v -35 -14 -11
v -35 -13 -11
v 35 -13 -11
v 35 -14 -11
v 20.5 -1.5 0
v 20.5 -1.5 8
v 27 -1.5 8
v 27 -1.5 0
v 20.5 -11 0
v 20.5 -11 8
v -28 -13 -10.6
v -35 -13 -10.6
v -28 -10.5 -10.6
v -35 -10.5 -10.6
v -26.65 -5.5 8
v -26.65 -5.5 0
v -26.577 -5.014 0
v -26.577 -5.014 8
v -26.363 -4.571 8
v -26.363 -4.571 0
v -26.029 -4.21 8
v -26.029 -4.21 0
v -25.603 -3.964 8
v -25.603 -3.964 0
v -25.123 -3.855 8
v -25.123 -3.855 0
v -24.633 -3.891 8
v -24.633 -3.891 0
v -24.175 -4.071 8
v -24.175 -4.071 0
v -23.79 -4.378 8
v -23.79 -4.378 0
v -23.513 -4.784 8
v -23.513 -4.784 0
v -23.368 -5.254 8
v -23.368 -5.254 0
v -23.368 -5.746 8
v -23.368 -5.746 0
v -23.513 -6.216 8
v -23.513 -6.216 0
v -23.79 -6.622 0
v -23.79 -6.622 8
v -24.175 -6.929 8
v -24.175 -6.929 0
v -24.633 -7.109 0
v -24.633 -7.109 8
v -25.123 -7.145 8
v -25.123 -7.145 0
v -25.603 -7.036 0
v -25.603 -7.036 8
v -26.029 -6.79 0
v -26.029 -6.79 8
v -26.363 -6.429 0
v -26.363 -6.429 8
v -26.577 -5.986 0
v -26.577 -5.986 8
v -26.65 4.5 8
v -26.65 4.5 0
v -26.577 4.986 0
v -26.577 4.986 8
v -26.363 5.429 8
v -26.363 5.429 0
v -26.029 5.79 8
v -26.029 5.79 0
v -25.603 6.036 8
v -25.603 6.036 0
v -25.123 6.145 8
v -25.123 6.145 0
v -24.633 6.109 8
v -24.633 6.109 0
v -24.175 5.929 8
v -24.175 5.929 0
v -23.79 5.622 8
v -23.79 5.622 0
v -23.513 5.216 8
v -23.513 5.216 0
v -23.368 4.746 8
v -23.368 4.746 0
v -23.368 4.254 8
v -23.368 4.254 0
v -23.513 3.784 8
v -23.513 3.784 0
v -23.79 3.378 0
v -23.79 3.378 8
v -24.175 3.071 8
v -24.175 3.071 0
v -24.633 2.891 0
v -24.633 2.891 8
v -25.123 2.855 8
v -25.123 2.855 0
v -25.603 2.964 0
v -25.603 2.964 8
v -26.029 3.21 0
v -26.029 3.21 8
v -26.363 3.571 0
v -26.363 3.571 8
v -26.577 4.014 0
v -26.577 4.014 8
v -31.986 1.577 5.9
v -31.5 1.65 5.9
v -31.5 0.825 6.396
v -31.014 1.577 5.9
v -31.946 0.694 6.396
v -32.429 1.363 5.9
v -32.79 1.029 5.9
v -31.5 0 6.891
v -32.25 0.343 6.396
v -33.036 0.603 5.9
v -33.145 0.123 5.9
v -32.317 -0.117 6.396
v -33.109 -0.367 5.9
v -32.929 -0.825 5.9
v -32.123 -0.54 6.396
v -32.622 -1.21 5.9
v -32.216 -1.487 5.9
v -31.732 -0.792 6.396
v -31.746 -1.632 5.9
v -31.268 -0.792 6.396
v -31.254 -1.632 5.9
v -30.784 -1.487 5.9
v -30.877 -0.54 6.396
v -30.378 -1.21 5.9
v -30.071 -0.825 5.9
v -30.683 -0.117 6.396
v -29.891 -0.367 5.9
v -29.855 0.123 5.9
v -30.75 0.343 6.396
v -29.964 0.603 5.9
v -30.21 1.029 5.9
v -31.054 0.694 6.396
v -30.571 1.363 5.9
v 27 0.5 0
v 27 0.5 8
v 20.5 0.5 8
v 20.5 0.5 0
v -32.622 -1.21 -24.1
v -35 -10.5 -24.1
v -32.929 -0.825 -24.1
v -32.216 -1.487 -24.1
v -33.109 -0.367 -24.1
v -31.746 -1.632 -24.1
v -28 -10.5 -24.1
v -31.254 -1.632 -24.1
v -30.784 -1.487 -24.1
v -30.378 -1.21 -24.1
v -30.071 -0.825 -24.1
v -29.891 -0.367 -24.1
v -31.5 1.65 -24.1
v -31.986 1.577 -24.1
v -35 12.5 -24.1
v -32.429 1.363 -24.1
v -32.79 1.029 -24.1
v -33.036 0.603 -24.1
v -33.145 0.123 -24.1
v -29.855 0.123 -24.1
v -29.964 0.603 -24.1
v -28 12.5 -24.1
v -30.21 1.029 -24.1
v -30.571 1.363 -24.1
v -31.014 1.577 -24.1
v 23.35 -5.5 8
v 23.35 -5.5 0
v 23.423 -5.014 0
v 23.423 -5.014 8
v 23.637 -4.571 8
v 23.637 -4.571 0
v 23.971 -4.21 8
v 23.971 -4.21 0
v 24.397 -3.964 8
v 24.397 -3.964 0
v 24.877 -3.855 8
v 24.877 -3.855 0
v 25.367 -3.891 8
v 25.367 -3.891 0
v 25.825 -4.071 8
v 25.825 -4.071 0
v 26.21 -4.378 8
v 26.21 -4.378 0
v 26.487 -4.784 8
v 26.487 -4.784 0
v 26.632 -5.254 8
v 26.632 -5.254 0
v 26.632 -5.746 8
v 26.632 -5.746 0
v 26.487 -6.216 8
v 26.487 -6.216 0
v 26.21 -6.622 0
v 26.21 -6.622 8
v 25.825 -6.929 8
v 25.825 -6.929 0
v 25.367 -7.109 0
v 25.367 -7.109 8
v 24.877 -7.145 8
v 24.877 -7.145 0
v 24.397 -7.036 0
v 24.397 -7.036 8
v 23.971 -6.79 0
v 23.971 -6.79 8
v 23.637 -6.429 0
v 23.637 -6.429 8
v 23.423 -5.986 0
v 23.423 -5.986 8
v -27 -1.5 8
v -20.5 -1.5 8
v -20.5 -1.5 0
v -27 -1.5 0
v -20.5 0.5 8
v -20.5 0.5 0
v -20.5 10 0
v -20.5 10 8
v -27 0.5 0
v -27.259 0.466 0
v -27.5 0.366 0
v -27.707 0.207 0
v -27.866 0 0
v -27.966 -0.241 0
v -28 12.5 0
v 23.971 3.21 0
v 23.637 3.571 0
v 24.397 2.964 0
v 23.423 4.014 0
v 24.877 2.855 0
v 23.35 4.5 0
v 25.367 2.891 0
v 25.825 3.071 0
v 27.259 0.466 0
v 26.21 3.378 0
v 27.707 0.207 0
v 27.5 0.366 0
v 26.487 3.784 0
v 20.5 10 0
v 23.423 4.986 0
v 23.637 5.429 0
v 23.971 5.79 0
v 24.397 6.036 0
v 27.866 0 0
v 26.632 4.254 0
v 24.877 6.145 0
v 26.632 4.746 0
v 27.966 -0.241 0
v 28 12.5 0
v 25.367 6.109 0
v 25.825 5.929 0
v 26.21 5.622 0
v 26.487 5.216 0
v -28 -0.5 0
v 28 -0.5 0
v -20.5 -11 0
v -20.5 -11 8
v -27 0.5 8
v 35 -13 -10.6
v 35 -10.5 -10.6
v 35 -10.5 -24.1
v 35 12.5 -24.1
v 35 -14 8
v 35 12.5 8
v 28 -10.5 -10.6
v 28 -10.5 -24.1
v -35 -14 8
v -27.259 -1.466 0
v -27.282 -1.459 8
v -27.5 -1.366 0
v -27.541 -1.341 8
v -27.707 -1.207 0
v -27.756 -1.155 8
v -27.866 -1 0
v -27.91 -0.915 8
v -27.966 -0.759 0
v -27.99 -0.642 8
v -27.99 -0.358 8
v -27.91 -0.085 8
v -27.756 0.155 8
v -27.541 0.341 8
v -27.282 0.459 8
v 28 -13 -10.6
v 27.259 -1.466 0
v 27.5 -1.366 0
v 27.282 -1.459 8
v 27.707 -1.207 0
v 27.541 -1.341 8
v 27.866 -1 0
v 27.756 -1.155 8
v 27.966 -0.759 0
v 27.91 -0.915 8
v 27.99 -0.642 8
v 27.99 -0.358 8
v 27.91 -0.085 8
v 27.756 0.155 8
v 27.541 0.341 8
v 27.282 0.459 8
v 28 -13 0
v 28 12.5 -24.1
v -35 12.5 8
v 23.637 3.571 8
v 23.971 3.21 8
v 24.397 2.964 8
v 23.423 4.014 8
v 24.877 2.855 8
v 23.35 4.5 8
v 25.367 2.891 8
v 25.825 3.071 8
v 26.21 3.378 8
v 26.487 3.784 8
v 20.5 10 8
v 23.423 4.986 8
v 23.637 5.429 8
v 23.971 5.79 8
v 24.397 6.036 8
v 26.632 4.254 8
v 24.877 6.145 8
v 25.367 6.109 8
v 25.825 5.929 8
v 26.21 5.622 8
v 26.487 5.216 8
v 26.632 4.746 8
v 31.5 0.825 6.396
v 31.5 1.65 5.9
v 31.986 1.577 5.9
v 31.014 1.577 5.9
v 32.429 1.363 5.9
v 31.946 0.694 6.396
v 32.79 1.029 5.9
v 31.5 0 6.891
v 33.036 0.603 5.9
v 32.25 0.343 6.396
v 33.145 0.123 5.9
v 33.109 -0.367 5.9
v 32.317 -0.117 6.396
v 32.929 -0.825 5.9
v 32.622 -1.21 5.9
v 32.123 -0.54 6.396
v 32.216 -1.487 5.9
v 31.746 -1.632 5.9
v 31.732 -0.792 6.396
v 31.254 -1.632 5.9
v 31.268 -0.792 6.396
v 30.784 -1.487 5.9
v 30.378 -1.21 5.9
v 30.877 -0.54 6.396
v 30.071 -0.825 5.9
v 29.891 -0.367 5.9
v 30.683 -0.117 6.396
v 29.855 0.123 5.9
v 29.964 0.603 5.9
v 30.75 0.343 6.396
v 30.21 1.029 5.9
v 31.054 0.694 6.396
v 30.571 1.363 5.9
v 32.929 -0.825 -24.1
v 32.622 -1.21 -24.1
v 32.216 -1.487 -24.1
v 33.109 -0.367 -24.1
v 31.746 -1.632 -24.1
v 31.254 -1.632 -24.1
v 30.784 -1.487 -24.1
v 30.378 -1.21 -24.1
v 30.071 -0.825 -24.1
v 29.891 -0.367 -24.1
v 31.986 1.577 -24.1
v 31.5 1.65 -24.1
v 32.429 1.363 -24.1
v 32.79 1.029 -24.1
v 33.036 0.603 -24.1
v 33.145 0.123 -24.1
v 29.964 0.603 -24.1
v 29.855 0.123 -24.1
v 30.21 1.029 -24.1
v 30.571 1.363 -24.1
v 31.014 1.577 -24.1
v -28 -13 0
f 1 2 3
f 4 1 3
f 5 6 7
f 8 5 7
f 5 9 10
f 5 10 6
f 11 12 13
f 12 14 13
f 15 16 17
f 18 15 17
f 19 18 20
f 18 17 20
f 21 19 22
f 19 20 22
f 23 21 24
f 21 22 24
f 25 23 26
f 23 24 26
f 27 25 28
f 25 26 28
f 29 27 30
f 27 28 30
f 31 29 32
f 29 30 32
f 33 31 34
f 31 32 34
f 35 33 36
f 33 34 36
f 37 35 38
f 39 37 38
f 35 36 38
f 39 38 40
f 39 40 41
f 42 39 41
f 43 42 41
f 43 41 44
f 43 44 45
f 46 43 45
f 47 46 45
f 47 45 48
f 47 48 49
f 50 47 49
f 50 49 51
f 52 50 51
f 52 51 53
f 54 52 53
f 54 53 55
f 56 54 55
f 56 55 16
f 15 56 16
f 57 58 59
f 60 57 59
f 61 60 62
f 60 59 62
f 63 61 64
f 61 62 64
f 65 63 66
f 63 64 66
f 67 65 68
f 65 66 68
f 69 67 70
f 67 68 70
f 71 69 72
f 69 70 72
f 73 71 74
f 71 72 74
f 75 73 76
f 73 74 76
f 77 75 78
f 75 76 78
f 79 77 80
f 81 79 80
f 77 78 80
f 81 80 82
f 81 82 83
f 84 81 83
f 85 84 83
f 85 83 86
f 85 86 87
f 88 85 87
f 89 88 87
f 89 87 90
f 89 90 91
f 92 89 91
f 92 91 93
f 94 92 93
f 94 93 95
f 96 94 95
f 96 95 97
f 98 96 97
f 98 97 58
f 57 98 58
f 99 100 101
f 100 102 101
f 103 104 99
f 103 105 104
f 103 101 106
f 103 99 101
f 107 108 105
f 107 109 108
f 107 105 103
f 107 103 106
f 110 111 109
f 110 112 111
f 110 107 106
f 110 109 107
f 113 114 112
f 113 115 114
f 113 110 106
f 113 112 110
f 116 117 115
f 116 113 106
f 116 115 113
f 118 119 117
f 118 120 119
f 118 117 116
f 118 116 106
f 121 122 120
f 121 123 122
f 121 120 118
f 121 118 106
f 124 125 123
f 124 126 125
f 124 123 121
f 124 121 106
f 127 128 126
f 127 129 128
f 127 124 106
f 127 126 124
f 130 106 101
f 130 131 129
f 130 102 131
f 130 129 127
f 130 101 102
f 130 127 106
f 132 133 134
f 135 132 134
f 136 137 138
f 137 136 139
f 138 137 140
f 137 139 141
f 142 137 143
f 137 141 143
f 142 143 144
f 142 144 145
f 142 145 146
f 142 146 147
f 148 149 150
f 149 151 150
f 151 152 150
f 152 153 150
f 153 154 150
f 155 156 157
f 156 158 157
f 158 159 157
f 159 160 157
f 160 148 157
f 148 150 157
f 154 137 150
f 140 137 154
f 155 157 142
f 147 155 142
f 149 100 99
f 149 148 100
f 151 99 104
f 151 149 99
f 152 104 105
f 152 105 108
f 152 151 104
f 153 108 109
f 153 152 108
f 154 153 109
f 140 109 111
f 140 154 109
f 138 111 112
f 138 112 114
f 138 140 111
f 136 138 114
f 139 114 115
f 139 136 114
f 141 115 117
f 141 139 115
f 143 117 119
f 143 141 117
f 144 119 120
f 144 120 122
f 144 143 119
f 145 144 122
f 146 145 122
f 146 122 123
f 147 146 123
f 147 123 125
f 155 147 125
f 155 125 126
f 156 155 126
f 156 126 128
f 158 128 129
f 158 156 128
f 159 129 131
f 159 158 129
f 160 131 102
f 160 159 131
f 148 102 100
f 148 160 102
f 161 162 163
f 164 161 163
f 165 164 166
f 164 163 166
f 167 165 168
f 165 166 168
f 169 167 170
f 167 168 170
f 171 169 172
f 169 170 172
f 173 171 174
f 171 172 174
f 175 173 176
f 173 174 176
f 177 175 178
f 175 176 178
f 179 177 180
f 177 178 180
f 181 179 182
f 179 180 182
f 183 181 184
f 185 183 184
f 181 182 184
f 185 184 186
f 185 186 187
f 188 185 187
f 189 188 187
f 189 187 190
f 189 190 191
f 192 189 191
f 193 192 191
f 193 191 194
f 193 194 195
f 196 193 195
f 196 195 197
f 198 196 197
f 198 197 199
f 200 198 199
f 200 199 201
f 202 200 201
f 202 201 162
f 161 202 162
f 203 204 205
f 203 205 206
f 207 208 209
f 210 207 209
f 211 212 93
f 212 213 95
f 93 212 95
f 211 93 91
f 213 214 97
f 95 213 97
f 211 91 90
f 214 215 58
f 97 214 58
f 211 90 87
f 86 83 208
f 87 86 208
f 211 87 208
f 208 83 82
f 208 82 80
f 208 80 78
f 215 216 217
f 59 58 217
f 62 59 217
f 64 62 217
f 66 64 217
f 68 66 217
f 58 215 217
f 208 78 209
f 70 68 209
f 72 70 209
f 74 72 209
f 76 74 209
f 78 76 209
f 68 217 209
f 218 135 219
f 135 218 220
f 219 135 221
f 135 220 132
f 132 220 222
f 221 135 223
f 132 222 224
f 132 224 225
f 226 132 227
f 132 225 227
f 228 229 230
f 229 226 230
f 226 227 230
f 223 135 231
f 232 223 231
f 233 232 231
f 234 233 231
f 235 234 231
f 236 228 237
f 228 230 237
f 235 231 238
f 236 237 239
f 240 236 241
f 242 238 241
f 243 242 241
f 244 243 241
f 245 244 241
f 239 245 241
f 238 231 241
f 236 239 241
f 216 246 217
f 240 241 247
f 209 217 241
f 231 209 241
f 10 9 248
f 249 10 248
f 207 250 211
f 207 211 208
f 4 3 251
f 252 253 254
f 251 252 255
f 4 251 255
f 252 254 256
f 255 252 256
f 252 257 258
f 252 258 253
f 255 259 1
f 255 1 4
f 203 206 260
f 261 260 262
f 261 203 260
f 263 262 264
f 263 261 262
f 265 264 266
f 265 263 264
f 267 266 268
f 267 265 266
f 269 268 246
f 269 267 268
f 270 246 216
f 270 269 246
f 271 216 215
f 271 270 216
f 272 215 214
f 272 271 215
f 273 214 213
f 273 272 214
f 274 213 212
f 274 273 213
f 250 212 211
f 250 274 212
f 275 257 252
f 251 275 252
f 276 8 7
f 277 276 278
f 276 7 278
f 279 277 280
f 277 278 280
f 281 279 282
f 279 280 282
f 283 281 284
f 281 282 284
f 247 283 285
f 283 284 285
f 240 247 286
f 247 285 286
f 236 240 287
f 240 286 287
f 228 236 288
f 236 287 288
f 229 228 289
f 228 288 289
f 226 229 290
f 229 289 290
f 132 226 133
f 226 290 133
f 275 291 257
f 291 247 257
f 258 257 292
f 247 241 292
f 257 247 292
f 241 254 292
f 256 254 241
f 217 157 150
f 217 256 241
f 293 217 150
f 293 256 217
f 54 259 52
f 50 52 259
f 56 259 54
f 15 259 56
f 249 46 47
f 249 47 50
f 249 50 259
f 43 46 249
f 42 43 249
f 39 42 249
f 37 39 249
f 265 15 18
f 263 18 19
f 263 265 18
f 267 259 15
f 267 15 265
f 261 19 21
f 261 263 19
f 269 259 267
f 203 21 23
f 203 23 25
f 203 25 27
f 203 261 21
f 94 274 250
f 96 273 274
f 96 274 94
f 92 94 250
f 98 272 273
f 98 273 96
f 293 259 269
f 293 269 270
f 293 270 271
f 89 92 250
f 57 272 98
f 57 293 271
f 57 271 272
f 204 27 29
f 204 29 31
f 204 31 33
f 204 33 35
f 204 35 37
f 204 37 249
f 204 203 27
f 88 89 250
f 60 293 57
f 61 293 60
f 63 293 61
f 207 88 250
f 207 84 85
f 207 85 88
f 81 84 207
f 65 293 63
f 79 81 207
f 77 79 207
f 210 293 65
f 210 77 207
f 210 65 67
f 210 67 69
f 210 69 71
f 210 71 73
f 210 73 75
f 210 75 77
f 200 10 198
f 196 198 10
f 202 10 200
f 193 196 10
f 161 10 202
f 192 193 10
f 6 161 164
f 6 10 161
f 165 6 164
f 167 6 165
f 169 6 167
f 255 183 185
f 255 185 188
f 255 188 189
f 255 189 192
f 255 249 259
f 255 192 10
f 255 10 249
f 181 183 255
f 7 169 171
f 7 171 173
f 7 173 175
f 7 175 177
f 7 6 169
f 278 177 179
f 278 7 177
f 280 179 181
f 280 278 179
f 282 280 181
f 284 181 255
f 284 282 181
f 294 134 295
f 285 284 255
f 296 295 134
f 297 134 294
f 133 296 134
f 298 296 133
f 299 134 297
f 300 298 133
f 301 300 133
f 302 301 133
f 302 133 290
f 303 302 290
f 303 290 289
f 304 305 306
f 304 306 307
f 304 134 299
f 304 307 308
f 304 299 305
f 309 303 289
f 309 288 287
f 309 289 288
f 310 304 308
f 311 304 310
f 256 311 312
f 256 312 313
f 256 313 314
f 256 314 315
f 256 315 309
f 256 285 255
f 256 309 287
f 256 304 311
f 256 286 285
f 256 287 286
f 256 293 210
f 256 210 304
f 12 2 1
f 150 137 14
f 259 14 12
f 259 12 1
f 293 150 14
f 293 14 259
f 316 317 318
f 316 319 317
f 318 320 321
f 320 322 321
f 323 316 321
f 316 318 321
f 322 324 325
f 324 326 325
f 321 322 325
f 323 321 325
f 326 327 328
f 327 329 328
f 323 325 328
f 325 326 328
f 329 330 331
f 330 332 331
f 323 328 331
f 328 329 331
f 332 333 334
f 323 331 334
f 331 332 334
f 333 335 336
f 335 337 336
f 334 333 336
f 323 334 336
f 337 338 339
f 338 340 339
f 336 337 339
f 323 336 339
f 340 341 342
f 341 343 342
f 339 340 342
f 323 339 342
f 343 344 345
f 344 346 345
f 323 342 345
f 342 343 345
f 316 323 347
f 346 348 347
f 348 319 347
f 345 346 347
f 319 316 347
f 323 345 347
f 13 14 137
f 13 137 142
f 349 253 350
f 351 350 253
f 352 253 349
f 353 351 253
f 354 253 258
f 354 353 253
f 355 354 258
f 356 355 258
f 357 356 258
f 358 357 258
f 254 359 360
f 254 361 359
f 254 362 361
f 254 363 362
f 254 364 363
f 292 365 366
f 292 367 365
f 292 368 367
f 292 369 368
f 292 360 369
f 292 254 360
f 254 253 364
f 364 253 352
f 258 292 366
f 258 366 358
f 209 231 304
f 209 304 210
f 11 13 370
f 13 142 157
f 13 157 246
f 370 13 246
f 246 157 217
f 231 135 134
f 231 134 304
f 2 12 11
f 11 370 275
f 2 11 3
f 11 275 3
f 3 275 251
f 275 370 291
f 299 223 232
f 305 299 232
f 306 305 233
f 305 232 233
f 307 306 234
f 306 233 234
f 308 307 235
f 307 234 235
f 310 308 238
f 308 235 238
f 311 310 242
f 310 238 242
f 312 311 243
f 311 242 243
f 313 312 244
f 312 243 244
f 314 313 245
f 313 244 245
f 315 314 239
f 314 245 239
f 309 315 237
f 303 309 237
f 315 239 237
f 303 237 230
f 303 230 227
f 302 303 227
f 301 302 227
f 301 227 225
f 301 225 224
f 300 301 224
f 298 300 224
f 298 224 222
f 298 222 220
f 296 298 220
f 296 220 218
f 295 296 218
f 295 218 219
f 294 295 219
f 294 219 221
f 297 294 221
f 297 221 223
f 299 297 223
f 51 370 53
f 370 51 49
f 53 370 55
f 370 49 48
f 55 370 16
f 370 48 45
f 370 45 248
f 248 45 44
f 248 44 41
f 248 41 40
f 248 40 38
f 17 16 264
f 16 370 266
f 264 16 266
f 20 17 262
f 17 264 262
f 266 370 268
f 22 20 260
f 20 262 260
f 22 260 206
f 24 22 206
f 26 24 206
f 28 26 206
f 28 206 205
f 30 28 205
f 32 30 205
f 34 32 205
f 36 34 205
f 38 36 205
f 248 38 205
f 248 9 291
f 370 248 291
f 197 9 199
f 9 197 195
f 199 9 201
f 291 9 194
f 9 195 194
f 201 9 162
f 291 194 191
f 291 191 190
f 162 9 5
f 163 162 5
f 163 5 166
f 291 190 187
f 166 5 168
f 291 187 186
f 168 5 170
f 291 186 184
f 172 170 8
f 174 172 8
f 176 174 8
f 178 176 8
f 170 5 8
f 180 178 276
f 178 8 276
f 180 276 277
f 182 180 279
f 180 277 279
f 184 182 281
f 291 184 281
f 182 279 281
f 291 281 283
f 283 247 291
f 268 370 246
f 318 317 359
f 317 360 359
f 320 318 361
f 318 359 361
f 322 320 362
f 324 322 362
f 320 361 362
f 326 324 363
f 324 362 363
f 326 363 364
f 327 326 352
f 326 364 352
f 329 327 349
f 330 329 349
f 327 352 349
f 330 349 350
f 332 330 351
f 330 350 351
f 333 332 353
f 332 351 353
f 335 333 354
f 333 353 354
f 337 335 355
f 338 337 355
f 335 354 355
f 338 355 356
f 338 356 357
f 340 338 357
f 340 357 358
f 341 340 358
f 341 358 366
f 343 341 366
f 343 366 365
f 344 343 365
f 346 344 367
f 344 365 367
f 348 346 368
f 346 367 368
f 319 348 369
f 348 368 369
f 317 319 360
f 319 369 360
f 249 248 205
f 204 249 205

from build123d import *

# Parameters (mm, degrees)
SKETCH_1_W          = 70
SKETCH_1_H          = 25
EXTRUDE_1_DEPTH     = 8
SKETCH_2_W          = 41
SKETCH_2_H          = 21
CUT_EXTRUDE_1_DEPTH = 24
CUT_EXTRUDE_4_DEPTH = 39.016443811
EXTRUDE_START       = -8
SKETCH_5_W          = 7
SKETCH_5_H          = 25
EXTRUDE_2_DEPTH     = 24.1
SKETCH_9_W          = 7
SKETCH_9_H          = 13.5
CUT_EXTRUDE_3_DEPTH = 2
EXTRUDE_11_DEPTH    = 0.5
SKETCH_20_W         = 70
SKETCH_20_H         = 19
EXTRUDE_12_DEPTH    = 1
M4X0_7_3_D          = 3.3


with BuildPart() as part:
    # 草圖1 → 填料-伸長1 (new body)
    with BuildSketch(Plane.XY):
        Rectangle(SKETCH_1_W, SKETCH_1_H)
    extrude(amount=EXTRUDE_1_DEPTH)

    # 草圖2 → 除料-伸長1 (cut)
    with BuildSketch(Plane(origin=(0, 0, 0), x_dir=(-1, 0, 0), z_dir=(0, 0, -1))):
        with Locations((0, -0.5)):
            Rectangle(SKETCH_2_W, SKETCH_2_H)
    extrude(amount=-CUT_EXTRUDE_1_DEPTH, mode=Mode.SUBTRACT)

    # 草圖10 → 除料-伸長4 (cut, through all)
    with BuildSketch(Plane.XY.offset(8)):
        with BuildLine():
            Line((-27, 0.5), (-14, 0.5))
            ThreePointArc((-14, 0.5), (-13, -0.5), (-14, -1.5))
            Line((-14, -1.5), (-27, -1.5))
            ThreePointArc((-27, -1.5), (-28, -0.5), (-27, 0.5))
        make_face()
    cut_extrude_4 = extrude(amount=-CUT_EXTRUDE_4_DEPTH, mode=Mode.SUBTRACT)

    # 草圖5 → 填料-伸長2 (add)
    with BuildSketch(Plane.XY.offset(8).offset(EXTRUDE_START)):
        with Locations((-31.5, 0)):
            Rectangle(SKETCH_5_W, SKETCH_5_H)
    extrude_2 = extrude(amount=-EXTRUDE_2_DEPTH)

    # 草圖8 → M4x0.7 螺紋孔1 (revolve, cut)
    with BuildSketch(Plane(origin=(-31.5, 0, -24.1), x_dir=(0, 1, 0), z_dir=(1, 0, 0))):
        Polygon((0, 0), (0, 30.991420021), (1.65, 30), (1.65, 0), align=None)
    m4x0_7_1 = revolve(axis=Axis((-31.5, 0, -30.45), (0, 0, 1)), mode=Mode.SUBTRACT)

    # 鏡射1: 除料-伸長4, 填料-伸長2, M4x0.7 螺紋孔1 across plane
    add(cut_extrude_4.mirror(Plane(origin=(0, 0, 0), x_dir=(0, 0, 1), z_dir=(1, 0, 0))), mode=Mode.SUBTRACT)
    add(extrude_2.mirror(Plane(origin=(0, 0, 0), x_dir=(0, 0, 1), z_dir=(1, 0, 0))))
    add(m4x0_7_1.mirror(Plane(origin=(0, 0, 0), x_dir=(0, 0, 1), z_dir=(1, 0, 0))), mode=Mode.SUBTRACT)

    # 草圖9 → 除料-伸長3 (cut)
    with BuildSketch(Plane.XZ.offset(12.5)):
        with Locations((31.5, -17.35)):
            Rectangle(SKETCH_9_W, SKETCH_9_H)
        with Locations((-31.5, -17.35)):
            Rectangle(SKETCH_9_W, SKETCH_9_H)
    extrude(amount=-CUT_EXTRUDE_3_DEPTH, mode=Mode.SUBTRACT)

    # 草圖19 → 填料-伸長11 (add)
    with BuildSketch(Plane.XZ.offset(12.5)):
        Polygon((35, 8), (-35, 8), (-35, -10.6), (-28, -10.6), (-28, 0), (28, 0), (28, -10.6), (35, -10.6), align=None)
    extrude(amount=EXTRUDE_11_DEPTH)

    # 草圖20 → 填料-伸長12 (add)
    with BuildSketch(Plane.XZ.offset(13)):
        with Locations((0, -1.5)):
            Rectangle(SKETCH_20_W, SKETCH_20_H)
    extrude(amount=EXTRUDE_12_DEPTH)

    # M4x0.7 螺紋孔3 (through all)
    with Locations(Plane.XY.offset(8)):
        with Locations((25, -5.5), (-25, 4.5), (-25, -5.5), (25, 4.5)):
            Hole(M4X0_7_3_D / 2)


solid = part.part
